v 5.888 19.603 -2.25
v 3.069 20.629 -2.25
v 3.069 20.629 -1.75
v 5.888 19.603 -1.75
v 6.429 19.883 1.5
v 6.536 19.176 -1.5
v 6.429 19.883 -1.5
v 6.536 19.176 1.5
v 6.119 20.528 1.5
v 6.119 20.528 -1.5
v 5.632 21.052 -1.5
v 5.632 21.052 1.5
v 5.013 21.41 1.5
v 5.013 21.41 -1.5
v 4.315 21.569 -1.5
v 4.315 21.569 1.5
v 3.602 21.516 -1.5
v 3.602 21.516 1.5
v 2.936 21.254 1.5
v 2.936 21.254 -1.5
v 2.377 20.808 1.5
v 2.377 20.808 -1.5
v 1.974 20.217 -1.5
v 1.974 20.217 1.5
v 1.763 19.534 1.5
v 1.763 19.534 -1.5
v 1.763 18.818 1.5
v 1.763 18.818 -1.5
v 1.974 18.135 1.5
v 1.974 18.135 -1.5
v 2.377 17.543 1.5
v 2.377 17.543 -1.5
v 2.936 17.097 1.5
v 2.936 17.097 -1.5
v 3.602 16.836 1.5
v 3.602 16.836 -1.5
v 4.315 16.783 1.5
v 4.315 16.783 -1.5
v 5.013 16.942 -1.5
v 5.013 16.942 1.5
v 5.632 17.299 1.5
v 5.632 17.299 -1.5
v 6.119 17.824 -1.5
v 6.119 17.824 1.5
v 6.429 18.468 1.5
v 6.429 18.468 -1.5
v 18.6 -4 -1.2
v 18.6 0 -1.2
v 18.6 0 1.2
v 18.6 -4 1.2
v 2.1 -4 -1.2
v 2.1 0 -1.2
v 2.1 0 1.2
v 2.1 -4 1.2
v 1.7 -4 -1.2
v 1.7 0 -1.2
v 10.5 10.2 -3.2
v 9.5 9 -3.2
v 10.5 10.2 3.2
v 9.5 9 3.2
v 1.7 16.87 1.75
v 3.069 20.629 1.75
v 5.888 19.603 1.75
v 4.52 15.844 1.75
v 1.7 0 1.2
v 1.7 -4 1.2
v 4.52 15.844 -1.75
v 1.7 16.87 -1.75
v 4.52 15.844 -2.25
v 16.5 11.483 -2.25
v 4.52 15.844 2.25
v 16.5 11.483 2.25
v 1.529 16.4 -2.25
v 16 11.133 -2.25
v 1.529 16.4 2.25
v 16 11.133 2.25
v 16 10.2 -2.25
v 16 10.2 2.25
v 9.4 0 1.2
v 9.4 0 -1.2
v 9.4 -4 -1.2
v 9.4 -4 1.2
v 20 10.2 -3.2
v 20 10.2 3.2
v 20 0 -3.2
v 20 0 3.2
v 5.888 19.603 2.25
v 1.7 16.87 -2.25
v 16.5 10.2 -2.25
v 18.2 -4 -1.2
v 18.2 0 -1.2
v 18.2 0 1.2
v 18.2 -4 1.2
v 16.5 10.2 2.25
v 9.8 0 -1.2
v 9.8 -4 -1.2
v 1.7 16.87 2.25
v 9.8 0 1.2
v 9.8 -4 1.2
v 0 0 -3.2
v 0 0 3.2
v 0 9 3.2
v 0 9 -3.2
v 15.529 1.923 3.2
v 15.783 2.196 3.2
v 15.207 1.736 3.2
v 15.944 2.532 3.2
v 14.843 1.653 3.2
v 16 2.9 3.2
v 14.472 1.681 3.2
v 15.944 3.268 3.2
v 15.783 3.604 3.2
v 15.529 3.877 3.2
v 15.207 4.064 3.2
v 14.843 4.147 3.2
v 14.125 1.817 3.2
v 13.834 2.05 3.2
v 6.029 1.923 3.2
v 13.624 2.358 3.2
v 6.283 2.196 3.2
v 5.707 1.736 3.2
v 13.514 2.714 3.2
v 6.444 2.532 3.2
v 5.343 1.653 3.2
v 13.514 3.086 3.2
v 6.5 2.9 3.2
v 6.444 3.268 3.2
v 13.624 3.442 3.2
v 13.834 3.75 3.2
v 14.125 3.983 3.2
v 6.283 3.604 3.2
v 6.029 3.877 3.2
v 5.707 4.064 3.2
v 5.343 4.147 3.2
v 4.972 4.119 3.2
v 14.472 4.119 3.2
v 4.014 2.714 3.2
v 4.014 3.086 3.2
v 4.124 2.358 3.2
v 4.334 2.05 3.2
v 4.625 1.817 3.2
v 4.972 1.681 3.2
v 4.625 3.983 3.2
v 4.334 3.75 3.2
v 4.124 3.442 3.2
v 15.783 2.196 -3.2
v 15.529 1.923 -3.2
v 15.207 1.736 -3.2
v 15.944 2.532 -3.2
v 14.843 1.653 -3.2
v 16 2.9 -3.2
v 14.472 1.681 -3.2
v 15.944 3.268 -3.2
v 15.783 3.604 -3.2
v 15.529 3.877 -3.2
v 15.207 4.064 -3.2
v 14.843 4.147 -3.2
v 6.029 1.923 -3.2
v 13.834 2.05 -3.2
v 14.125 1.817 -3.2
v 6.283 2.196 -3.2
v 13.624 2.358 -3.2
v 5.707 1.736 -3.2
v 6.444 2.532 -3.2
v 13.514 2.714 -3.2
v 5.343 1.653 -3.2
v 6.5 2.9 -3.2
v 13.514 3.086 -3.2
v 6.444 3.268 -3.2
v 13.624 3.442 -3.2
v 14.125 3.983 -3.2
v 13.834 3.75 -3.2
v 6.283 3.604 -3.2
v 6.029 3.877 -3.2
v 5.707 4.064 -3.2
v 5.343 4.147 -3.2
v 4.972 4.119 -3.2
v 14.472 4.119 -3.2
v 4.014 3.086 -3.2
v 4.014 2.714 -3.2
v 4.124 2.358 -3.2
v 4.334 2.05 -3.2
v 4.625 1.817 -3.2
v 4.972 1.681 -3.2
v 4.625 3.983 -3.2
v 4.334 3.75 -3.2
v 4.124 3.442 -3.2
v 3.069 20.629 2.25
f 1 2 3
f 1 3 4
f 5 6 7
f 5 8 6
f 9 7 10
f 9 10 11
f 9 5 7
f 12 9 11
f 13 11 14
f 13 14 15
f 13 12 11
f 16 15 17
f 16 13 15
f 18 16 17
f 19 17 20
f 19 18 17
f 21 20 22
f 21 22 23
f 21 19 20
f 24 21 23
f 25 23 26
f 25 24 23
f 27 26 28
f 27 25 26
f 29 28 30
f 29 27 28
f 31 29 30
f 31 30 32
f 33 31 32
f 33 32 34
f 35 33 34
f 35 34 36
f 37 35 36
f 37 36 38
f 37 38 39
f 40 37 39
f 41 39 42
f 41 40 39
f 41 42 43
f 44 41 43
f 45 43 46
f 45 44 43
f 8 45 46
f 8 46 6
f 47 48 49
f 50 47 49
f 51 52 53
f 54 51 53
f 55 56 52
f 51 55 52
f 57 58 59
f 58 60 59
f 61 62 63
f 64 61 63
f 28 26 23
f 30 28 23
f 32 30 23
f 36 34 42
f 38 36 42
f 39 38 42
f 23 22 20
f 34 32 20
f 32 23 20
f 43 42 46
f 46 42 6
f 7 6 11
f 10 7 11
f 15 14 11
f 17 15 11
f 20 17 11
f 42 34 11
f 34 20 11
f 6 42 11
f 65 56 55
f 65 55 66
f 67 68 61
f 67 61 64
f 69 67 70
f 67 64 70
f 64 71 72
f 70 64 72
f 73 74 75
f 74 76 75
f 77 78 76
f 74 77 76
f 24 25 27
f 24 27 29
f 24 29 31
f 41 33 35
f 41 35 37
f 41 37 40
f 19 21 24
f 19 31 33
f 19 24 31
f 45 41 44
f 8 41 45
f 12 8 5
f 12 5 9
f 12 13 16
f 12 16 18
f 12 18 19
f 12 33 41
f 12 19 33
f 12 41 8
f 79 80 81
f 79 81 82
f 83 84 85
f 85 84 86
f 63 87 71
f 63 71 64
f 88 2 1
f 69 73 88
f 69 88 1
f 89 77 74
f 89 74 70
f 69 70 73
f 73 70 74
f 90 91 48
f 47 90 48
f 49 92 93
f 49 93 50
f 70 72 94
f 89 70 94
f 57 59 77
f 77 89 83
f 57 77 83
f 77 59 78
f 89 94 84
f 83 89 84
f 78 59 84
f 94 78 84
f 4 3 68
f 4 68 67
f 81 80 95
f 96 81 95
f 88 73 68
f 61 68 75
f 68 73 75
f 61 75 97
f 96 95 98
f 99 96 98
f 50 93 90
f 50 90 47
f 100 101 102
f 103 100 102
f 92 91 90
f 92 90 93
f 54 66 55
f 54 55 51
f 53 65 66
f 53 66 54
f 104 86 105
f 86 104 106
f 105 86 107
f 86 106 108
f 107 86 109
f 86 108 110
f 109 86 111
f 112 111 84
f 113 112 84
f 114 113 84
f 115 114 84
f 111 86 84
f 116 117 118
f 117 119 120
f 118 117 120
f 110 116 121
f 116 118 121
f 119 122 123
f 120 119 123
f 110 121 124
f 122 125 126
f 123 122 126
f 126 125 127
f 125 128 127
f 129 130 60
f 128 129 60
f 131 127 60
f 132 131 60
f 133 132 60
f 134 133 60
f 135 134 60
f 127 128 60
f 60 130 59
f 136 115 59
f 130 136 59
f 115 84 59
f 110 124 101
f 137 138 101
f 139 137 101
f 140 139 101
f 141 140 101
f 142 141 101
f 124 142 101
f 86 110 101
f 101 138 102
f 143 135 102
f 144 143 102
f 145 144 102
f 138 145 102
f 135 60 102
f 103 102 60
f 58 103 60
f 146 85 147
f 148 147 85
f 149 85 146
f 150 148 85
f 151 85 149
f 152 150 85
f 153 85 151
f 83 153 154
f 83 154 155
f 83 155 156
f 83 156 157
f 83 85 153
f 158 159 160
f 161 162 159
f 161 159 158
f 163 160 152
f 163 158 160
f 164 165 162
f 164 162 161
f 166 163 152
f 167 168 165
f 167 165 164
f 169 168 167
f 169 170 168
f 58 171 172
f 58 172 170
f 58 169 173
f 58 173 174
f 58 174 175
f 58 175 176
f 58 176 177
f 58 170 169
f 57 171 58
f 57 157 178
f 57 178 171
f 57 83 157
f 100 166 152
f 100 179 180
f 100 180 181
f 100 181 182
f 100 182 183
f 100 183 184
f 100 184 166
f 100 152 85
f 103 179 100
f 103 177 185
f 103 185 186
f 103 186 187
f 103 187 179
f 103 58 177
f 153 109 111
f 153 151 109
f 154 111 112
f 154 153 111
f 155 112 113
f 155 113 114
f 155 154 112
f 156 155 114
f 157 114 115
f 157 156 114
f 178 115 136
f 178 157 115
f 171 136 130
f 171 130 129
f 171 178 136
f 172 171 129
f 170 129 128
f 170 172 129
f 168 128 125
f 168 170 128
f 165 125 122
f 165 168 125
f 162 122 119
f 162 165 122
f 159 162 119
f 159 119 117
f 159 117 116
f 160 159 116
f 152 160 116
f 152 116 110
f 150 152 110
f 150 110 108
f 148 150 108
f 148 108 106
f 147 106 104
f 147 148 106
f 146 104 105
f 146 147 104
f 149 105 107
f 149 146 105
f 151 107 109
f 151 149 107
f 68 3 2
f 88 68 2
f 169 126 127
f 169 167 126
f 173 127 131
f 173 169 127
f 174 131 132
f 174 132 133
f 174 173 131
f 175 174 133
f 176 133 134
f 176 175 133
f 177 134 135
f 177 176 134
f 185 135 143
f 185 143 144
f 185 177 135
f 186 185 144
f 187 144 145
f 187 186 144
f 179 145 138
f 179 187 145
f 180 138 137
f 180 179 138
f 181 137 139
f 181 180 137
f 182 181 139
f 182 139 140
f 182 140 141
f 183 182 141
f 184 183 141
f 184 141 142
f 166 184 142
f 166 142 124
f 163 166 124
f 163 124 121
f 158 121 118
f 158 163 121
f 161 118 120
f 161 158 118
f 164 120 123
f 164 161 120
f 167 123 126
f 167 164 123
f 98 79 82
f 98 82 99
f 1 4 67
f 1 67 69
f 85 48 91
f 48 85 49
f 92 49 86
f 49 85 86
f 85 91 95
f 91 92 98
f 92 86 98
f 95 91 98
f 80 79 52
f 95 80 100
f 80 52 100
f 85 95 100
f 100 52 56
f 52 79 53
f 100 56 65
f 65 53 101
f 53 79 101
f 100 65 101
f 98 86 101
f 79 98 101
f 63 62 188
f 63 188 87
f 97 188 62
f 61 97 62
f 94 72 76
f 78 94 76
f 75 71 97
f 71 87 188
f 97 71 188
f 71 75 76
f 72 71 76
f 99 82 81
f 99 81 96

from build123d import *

# Parameters (mm, degrees)
CROQUIS1_R              = 1.25
SALIENTE_EXTRUIR1_DEPTH = 3.2
CROQUIS2_W              = 0.4
CROQUIS2_H              = 2.4
SALIENTE_EXTRUIR2_DEPTH = 4
SALIENTE_EXTRUIR3_DEPTH = 2.25
CROQUIS4_W              = 3
CROQUIS4_H              = 0.5
SALIENTE_EXTRUIR4_DEPTH = 4
CROQUIS5_R              = 2.4
SALIENTE_EXTRUIR5_DEPTH = 1.5


with BuildPart() as part:
    # Croquis1 → Saliente-Extruir1 (new body, symmetric)
    with BuildSketch(Plane.XY):
        Polygon((0, 9), (9.5, 9), (10.5, 10.2), (20, 10.2), (20, 0), (0, 0), align=None)
        with Locations((5.25, 2.9)):
            Circle(CROQUIS1_R, mode=Mode.SUBTRACT)
        with Locations((14.75, 2.9)):
            Circle(CROQUIS1_R, mode=Mode.SUBTRACT)
    extrude(amount=SALIENTE_EXTRUIR1_DEPTH, both=True)

    # Croquis2 → Saliente-Extruir2 (add)
    with BuildSketch(Plane.XZ):
        with Locations((1.9, 0)):
            Rectangle(CROQUIS2_W, CROQUIS2_H)
        with Locations((9.6, 0)):
            Rectangle(CROQUIS2_W, CROQUIS2_H)
        with Locations((18.4, 0)):
            Rectangle(CROQUIS2_W, CROQUIS2_H)
    extrude(amount=SALIENTE_EXTRUIR2_DEPTH)

    # Croquis3 → Saliente-Extruir3 (add, symmetric)
    with BuildSketch(Plane.XY):
        Polygon((16, 10.2), (16, 11.133146081), (1.529437785, 16.4), (1.700447857, 16.86984631), (16.5, 11.48324985), (16.5, 10.2), align=None)
    extrude(amount=SALIENTE_EXTRUIR3_DEPTH, both=True)

    # Croquis4 → Saliente-Extruir4 (add)
    with BuildSketch(Plane(origin=(5.620778705, 15.442962573, 0), x_dir=(0.939692621, -0.342020143, 0), z_dir=(0.342020143, 0.939692621, 0))):
        with Locations((-2.67192895, 2)):
            Rectangle(CROQUIS4_W, CROQUIS4_H)
        with Locations((-2.67192895, -2)):
            Rectangle(CROQUIS4_W, CROQUIS4_H)
    extrude(amount=SALIENTE_EXTRUIR4_DEPTH)


with BuildPart() as body_2:
    # Croquis5 → Saliente-Extruir5 (new body, symmetric)
    with BuildSketch(Plane.XY):
        with Locations((4.136047218, 19.175893958)):
            Circle(CROQUIS5_R)
    extrude(amount=SALIENTE_EXTRUIR5_DEPTH, both=True)


solid = Compound([part.part, body_2.part])
